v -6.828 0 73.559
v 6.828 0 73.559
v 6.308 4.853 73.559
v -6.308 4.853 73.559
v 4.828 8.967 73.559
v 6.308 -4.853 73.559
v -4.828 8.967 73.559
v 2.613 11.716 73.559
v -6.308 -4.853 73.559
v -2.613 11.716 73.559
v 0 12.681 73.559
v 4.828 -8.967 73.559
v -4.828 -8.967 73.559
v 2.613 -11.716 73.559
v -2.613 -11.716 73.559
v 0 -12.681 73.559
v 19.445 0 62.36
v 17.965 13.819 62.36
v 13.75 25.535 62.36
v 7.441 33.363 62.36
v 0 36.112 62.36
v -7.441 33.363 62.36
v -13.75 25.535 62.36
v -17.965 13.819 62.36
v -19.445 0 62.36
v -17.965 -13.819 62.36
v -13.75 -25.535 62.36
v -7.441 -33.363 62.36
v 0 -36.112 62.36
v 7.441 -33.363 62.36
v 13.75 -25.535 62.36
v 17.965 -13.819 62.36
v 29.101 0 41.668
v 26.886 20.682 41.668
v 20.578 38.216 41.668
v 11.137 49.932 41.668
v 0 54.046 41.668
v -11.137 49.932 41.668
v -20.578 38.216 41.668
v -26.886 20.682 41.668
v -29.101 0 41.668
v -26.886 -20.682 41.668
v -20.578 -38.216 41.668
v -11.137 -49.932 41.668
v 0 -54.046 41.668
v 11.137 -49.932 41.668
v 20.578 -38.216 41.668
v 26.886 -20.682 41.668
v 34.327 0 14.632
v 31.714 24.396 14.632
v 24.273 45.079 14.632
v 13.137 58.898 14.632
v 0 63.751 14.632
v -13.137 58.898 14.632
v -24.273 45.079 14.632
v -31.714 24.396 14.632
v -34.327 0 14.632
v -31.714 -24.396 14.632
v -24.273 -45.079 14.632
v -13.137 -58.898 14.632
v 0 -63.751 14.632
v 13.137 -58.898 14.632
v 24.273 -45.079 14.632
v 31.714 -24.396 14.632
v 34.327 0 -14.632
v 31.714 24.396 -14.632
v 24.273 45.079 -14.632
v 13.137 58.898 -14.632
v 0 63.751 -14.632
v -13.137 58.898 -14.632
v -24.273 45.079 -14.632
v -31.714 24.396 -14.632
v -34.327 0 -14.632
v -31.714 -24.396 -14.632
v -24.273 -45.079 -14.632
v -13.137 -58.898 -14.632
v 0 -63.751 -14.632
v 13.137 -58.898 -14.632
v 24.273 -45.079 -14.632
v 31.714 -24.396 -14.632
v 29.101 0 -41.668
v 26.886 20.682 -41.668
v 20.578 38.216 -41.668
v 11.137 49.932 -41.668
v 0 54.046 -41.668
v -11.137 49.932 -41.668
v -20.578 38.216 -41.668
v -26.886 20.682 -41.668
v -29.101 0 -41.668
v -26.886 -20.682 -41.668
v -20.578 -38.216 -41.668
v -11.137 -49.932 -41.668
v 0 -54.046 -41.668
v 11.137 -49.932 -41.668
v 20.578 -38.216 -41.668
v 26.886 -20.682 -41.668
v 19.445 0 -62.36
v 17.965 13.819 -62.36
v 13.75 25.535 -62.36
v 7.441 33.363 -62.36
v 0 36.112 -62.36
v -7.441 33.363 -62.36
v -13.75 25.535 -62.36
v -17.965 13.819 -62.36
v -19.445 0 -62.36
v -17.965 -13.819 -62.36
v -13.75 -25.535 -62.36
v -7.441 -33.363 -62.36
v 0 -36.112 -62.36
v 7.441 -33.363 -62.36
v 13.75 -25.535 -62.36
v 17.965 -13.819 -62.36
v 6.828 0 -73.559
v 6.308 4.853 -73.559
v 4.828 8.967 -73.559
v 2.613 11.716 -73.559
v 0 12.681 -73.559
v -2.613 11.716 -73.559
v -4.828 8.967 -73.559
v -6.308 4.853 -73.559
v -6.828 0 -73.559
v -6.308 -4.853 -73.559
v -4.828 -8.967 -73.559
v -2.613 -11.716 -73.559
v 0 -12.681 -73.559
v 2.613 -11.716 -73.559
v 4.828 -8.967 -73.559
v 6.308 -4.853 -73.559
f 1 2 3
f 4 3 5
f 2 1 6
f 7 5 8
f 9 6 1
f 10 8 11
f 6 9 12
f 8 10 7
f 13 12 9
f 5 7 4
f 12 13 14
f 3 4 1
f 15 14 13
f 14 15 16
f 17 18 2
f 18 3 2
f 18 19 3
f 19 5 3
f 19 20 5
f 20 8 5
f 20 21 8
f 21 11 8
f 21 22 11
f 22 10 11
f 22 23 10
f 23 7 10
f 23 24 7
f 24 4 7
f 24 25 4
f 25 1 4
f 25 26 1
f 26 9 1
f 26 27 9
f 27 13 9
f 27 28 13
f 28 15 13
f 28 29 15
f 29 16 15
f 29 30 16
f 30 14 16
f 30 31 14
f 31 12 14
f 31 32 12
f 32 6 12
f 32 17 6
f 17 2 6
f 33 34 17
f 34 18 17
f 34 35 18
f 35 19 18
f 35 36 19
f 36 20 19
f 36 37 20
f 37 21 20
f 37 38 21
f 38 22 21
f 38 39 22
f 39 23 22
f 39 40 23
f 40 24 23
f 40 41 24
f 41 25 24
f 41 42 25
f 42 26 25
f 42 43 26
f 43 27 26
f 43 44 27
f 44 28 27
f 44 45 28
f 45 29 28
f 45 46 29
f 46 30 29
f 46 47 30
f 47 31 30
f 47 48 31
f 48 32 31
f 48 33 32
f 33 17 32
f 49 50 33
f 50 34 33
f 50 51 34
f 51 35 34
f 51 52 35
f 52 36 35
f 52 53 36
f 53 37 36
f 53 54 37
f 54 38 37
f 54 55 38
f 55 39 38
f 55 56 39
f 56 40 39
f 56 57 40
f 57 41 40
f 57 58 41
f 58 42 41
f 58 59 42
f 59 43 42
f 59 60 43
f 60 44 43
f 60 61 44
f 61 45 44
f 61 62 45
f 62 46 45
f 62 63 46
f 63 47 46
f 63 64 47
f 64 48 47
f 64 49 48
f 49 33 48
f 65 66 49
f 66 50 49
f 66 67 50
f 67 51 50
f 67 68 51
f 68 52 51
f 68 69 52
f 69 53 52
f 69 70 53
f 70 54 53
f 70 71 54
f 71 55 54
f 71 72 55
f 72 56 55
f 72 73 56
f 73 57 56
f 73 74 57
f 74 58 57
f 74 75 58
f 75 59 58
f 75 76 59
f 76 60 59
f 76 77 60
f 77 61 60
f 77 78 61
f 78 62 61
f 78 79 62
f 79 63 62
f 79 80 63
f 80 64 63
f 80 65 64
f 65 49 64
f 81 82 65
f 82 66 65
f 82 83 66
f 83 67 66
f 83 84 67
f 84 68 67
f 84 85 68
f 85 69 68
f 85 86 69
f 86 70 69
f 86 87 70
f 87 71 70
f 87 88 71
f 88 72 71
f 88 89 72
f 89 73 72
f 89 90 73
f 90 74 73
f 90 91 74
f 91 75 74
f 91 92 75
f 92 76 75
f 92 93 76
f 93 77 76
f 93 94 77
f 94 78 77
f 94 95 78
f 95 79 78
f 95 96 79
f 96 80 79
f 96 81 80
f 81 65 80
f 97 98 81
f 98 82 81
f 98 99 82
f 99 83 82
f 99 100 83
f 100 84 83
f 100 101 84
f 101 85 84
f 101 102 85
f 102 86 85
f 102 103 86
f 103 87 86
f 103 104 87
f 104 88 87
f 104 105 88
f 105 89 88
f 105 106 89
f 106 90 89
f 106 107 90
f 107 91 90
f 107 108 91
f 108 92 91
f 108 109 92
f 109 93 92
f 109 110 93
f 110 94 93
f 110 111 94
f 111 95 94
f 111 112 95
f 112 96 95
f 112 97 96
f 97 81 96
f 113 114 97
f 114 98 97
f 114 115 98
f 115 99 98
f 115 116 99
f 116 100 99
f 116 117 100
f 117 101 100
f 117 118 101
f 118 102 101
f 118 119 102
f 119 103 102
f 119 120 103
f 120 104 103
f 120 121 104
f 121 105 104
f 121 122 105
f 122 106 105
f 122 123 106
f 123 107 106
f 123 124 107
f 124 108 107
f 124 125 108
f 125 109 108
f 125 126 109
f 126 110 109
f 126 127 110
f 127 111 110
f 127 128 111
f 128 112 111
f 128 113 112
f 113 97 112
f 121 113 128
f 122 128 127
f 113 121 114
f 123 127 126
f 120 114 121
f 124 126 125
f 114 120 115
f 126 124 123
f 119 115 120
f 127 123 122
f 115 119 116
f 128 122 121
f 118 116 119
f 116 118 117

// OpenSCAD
// Generated by SolidPython 1.0.1 on 2020-07-29 00:46:47


scale(v = [7, 13, 15]) {
	sphere(r = 5);
}
/***********************************************
*********      SolidPython code:      **********
************************************************
 
# import packages: SolidPython
from solid import *
from solid.utils import *
from itertools import chain, combinations, permutations


class Resize:

    def __init__(self, scad_file):
        self.scad_file = scad_file
        #self.scad_file = import_scad(scad_file)
        # cone/cylinder param:
        self.r1 = 0
        self.r2 = 0
        self.h = 0
        # rectangular prism param:
        self.w = 0
        self.l = 0
        # ellipse param:
        self.r = 0

    # import OpenScad code (file name corresponds to shape)


    # classify shape + parameters
    def assign(self, param1, param2, param3):
        if self.scad_file == 'cone.scad':
            self.r1 = param1
            self.r2 = param2
            self.h = param3
        elif self.scad_file == 'cylinder.scad':
            self.r1 = param1
            self.r2 = param2
            self.h = param3
        elif self.scad_file == 'rectangularPrism.scad':
            self.h = param1
            self.l = param2
            self.w = param3
        else:
            self.r = param1
            self.h = param2

    # resize parameters
    def iterate(self):
        x = range(3, 20, 2)
        i = 1
        if self.scad_file == 'cone.scad':
            tempList = list(permutations(x, 2))
            for temp in tempList:
                param1 = temp[0]
                param2 = temp[1]
                filepath = 'produced_scad_files/' + 'cone' + str(param1) + '_' + str(param2) + '_' + '.scad'
                scad_render_to_file(cylinder(h=param1, r1=param2, r2=0), filepath)

        elif self.scad_file == 'cylinder.scad':
            tempList = list(permutations(x, 3))
            for temp in tempList:
                param1 = temp[0]
                param2 = temp[1]
                filepath = 'produced_scad_files/' + 'cylinder' + str(param1) + '_' + str(param2) + '_' + '.scad'
                scad_render_to_file(cylinder(h=param1, r1=param2, r2=param2), filepath)

        elif self.scad_file == 'rectangularPrism.scad':
            tempList = list(permutations(x, 3))
            for temp in tempList:
                param1 = temp[0]
                param2 = temp[1]
                param3 = temp[2]
                filepath = 'produced_scad_files/' + 'rectangularPrism' + str(param1) + '_' + str(param2) + '_' + str(
                    param3) + '.scad'
                scad_render_to_file(cube(size=(param1, param2, param3)), filepath)

        elif self.scad_file == 'ellipse.scad':
            tempList = list(permutations(x, 4))
            for temp in tempList:
                param1 = temp[0]
                param2 = temp[1]
                param3 = temp[2]
                param4 = temp[3]
                filepath = 'produced_scad_files/' + 'ellipse' + str(param1) + '_' + str(param2) + '_' + str(param3) + '_' + str(param4) + '.scad'
                scad_render_to_file(scale([param1, param2, param3])(sphere(r=param4)), filepath)

    def render_to_scadfile(self):
        scad_render_to_file(scad, 'example.scad') 
 
************************************************/
